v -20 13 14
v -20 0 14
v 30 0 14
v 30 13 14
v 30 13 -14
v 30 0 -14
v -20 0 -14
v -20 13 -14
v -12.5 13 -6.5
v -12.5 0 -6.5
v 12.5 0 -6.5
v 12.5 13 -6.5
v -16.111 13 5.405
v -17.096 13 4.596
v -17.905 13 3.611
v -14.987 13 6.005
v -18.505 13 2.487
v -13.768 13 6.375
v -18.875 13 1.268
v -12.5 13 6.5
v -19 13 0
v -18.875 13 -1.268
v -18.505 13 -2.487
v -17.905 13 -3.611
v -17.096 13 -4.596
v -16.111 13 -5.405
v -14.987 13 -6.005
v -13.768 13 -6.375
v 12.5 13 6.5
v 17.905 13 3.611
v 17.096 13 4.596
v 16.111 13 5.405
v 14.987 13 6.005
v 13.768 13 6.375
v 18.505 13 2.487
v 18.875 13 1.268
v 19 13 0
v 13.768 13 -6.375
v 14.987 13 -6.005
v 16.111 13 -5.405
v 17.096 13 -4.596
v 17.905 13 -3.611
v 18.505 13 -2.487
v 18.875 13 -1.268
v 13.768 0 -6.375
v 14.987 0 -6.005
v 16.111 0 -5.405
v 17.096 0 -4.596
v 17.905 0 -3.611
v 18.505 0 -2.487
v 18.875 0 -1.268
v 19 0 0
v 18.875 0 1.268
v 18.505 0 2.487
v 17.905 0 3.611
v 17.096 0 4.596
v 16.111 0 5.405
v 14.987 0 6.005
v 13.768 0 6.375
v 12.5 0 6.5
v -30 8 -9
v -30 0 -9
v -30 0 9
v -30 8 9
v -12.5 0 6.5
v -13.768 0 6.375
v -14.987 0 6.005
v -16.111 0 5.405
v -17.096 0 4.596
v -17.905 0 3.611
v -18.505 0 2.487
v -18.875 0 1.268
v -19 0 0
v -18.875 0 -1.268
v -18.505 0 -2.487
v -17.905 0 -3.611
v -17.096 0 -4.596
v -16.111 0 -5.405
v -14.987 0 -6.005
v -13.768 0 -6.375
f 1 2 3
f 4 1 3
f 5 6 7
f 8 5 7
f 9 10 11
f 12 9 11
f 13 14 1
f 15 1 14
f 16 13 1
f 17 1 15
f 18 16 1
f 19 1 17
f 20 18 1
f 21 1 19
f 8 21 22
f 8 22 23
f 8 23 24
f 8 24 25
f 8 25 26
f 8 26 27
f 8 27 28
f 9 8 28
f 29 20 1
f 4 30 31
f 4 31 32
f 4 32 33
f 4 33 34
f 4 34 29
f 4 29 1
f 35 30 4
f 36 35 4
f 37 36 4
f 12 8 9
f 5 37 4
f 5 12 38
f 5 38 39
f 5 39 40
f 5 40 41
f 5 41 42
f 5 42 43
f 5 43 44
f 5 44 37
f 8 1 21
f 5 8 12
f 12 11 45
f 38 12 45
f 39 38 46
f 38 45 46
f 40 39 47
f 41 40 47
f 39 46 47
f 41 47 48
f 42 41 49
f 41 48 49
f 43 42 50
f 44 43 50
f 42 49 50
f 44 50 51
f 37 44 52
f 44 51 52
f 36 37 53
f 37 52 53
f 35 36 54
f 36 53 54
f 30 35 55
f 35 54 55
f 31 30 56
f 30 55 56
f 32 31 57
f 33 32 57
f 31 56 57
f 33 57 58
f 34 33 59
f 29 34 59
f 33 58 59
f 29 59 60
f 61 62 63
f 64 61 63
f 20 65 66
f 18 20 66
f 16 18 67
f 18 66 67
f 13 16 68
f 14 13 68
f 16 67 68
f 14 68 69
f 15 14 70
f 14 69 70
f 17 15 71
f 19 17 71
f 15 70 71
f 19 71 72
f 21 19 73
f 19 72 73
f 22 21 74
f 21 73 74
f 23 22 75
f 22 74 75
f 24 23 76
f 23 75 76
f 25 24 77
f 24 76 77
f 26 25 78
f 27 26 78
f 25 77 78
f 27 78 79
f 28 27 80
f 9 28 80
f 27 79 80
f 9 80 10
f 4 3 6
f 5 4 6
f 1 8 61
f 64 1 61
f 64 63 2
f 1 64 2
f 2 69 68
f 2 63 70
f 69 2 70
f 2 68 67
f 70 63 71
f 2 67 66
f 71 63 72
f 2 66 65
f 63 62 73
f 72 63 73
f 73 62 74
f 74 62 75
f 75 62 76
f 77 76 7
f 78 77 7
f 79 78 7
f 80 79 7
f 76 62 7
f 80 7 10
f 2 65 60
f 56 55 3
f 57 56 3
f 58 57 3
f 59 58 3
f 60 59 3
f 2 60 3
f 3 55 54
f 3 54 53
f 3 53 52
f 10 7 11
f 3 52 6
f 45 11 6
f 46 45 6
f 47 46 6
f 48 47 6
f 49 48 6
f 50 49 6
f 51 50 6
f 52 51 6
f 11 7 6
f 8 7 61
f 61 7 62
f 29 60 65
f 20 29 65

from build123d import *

# Parameters (mm, degrees)
BOSS_EXTRUDE1_DEPTH = 13
CUT_EXTRUDE1_DEPTH  = 44.0464865


with BuildPart() as part:
    # Sketch1 → Boss-Extrude1 (new body)
    with BuildSketch(Plane(origin=(0, 0, 0), x_dir=(1, 0, 0), z_dir=(0, 1, 0))):
        Polygon((-20, -14), (30, -14), (30, 14), (-20, 14), (-30, 9), (-30, -9), align=None)
        with BuildLine():
            Line((-12.5, 6.5), (12.5, 6.5))
            ThreePointArc((12.5, 6.5), (19, 0), (12.5, -6.5))
            Line((12.5, -6.5), (-12.5, -6.5))
            ThreePointArc((-12.5, -6.5), (-19, 0), (-12.5, 6.5))
        make_face(mode=Mode.SUBTRACT)
    extrude(amount=BOSS_EXTRUDE1_DEPTH)

    # Sketch2 → Cut-Extrude1 (cut, through all)
    with BuildSketch(Plane.XY.offset(14)):
        Polygon((-30, 13), (-20, 13), (-30, 8), align=None)
    extrude(amount=-CUT_EXTRUDE1_DEPTH, mode=Mode.SUBTRACT)


solid = part.part
